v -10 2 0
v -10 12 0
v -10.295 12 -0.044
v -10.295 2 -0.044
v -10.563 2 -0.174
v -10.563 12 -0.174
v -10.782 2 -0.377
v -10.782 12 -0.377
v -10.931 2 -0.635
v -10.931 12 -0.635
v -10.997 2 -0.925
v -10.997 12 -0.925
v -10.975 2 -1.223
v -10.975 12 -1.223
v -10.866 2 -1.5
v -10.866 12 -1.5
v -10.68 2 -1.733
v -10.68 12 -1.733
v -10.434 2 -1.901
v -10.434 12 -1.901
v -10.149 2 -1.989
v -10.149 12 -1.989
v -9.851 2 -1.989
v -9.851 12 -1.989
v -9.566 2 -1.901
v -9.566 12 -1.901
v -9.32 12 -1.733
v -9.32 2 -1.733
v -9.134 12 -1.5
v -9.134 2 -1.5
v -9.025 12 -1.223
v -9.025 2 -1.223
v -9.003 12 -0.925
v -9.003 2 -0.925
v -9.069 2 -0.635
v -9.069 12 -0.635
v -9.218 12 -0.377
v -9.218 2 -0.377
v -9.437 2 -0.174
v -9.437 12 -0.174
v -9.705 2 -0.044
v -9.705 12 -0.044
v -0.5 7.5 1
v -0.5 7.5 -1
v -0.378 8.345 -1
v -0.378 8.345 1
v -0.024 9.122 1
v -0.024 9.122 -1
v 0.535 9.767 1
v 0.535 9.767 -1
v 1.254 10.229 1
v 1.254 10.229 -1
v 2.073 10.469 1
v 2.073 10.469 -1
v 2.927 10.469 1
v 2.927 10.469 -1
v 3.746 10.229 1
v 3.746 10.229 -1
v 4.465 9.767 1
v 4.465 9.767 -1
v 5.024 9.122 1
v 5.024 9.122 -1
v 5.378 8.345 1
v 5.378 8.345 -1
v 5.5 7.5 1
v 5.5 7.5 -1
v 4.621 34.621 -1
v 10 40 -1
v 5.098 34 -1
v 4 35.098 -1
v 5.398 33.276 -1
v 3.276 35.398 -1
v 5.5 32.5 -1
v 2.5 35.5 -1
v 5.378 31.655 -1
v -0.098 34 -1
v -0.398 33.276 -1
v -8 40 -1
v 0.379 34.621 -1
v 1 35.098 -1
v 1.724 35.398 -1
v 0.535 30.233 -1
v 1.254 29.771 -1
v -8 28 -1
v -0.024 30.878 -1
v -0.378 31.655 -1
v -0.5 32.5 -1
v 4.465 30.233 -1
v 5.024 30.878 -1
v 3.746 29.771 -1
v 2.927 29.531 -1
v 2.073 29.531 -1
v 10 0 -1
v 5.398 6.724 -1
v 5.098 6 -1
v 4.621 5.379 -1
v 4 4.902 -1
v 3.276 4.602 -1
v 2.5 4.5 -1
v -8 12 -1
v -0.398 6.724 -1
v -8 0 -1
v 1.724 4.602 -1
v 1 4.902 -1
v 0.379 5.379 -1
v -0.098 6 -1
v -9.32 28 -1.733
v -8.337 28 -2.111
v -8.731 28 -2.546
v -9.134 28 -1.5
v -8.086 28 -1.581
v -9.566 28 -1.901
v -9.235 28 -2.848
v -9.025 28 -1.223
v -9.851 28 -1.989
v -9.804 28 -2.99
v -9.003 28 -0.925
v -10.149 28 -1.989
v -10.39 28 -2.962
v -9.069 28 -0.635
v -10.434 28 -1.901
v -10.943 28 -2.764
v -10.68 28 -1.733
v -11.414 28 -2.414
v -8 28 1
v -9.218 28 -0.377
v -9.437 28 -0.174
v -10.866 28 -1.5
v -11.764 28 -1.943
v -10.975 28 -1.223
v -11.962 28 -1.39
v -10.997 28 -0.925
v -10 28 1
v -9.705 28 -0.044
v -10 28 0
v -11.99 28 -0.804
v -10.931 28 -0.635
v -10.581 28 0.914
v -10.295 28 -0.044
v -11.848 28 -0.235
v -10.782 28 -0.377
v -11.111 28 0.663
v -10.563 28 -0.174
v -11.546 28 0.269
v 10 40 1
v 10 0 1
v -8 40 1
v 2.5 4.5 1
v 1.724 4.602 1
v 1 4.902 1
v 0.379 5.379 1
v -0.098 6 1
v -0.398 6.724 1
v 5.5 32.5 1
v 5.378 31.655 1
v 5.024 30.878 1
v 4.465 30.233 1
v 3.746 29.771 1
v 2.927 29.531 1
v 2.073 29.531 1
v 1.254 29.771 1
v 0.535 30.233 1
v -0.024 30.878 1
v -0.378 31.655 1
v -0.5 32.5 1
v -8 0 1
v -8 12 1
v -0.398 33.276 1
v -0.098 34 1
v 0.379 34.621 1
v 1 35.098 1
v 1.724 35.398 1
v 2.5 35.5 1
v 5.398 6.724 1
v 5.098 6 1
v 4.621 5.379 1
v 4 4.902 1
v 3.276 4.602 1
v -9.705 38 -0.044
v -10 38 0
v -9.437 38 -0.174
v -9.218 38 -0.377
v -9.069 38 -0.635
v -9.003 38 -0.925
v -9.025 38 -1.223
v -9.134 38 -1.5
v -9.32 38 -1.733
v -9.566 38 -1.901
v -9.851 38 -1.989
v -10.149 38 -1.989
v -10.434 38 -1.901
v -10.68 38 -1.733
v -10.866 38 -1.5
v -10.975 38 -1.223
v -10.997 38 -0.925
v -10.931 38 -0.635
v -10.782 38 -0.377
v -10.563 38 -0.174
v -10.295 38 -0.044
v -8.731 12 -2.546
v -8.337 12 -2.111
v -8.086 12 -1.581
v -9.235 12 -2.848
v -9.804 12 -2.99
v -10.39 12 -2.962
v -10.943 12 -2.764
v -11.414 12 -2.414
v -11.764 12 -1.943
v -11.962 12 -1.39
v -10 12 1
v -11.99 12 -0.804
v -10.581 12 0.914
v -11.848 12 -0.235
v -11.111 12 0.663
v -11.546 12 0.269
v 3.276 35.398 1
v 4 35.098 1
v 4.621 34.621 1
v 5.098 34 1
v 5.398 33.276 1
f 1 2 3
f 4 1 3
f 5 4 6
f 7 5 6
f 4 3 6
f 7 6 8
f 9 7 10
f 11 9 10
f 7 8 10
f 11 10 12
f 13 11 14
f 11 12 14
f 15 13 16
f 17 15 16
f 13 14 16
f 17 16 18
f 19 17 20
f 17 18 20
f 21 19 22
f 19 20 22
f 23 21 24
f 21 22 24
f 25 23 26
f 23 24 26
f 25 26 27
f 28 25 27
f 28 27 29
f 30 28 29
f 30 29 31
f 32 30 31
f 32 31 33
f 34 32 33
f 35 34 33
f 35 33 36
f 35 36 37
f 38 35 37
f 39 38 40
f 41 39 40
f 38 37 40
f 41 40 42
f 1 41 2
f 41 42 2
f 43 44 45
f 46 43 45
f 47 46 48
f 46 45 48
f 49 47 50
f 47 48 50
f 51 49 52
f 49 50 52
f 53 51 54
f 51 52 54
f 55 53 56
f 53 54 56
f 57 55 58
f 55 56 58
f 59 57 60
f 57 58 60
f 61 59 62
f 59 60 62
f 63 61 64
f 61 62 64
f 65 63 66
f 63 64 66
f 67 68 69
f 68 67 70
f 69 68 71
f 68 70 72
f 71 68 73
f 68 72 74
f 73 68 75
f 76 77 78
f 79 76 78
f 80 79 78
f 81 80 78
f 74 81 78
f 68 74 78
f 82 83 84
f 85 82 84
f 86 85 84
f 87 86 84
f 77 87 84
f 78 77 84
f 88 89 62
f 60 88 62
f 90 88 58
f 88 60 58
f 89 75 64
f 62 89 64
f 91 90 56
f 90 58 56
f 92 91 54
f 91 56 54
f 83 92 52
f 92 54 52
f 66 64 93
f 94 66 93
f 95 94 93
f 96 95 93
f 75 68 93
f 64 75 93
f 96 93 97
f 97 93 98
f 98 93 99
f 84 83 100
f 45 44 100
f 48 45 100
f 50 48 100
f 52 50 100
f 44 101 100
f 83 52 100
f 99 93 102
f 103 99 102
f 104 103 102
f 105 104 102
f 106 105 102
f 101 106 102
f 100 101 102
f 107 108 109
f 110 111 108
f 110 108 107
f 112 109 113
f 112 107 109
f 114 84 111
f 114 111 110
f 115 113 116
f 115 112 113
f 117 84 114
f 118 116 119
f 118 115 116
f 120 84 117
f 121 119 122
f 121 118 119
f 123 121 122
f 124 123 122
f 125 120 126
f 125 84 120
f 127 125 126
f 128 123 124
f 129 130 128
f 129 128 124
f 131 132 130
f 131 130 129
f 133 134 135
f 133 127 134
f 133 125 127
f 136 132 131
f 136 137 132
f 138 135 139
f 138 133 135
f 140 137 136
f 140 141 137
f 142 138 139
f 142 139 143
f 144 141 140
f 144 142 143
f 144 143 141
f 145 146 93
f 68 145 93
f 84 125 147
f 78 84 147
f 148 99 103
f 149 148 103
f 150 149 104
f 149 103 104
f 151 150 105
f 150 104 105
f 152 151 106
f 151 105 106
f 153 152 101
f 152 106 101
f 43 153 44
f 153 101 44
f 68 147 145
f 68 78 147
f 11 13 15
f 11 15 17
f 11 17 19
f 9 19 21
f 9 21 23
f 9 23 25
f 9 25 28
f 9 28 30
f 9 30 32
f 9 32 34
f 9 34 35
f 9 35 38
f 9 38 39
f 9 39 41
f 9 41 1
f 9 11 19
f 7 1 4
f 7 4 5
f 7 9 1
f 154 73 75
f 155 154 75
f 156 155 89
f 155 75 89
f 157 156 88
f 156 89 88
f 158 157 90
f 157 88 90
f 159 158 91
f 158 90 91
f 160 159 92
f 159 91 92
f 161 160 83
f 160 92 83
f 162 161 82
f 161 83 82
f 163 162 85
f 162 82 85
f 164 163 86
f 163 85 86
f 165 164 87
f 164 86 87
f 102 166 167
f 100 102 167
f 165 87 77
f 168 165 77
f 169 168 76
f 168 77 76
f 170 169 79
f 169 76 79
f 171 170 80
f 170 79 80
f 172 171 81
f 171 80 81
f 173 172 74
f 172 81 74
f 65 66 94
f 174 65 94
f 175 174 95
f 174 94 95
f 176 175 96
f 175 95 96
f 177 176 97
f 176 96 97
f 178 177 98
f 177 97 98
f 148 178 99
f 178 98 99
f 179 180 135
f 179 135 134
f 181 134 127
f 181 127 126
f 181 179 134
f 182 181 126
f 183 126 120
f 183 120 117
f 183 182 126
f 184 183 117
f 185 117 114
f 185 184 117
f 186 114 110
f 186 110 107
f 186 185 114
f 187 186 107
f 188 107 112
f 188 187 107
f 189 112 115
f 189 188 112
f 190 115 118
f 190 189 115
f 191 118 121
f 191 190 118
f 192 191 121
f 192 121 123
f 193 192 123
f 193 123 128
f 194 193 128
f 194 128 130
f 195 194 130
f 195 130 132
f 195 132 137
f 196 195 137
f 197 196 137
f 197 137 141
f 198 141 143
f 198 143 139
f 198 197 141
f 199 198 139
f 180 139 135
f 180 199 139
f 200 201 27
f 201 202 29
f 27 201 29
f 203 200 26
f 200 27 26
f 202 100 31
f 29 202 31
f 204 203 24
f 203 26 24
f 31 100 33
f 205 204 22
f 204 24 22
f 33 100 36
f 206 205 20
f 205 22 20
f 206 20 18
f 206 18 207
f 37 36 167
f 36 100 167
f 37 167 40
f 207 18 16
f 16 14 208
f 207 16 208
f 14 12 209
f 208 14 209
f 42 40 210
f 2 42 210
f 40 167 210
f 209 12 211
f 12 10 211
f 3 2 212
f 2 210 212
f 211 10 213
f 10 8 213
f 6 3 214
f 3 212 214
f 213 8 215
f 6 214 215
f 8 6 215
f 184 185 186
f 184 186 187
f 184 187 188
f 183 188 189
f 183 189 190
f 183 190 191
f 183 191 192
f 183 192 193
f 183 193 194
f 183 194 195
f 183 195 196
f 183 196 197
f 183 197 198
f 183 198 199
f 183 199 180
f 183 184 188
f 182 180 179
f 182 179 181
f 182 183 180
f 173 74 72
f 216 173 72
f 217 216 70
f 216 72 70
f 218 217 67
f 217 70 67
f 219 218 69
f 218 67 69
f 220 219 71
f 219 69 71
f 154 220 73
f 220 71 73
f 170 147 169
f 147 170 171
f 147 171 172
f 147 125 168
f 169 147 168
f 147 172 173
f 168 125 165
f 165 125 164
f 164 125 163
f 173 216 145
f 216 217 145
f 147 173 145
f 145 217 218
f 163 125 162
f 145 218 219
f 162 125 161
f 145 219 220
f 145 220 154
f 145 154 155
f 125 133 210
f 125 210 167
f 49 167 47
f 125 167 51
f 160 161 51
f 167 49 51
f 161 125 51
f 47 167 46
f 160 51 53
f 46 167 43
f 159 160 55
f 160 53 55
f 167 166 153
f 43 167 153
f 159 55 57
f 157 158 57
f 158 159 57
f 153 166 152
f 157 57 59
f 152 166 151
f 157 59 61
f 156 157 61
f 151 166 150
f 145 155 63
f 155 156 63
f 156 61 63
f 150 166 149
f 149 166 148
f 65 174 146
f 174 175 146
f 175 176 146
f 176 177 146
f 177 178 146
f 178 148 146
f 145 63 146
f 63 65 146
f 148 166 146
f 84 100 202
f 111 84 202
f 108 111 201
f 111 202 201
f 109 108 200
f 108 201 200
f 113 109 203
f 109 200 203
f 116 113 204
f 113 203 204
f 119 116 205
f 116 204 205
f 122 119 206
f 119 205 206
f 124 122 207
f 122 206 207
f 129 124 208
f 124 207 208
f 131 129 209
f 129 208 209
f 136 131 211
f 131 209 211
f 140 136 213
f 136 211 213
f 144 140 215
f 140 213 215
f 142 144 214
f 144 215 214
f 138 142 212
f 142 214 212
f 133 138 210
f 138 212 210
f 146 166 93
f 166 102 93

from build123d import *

# Parameters (mm, degrees)
EXTRUDE_1_DEPTH          = 40
CUT_EXTRUDE_1_DEPTH      = 40
CUT_EXTRUDE_1_DEPTH_BACK = 40
SKETCH_2_W               = 4
SKETCH_2_H               = 12
EXTRUDE_2_DEPTH          = 10
EXTRUDE_START            = 10
EXTRUDE_3_DEPTH          = 10
SKETCH_5_R               = 3
CUT_EXTRUDE_2_DEPTH      = 10


with BuildPart() as part:
    # 草图1 → 凸台-拉伸1 (new body)
    with BuildSketch(Plane(origin=(0, 0, 0), x_dir=(1, 0, 0), z_dir=(0, 1, 0))):
        with BuildLine():
            Line((10, 1), (-8, 1))
            ThreePointArc((-8, 1), (-11.414213562, 2.414213562), (-10, -1))
            Line((-10, -1), (10, -1))
            Line((10, -1), (10, 1))
        make_face()
    extrude(amount=EXTRUDE_1_DEPTH)

    # 草图2 → 切除-拉伸1 (cut, two sides: drawn at the far end of the back side and taken through both)
    with BuildSketch(Plane(origin=(0, 0, -1), x_dir=(-1, 0, 0), z_dir=(0, 0, -1)).offset(-CUT_EXTRUDE_1_DEPTH_BACK)):
        with Locations((10, 6)):
            Rectangle(SKETCH_2_W, SKETCH_2_H)
        with Locations((10, 34)):
            Rectangle(SKETCH_2_W, SKETCH_2_H)
    extrude(amount=CUT_EXTRUDE_1_DEPTH + CUT_EXTRUDE_1_DEPTH_BACK, mode=Mode.SUBTRACT)

    # 草图3 → 凸台-拉伸2 (add)
    with BuildSketch(Plane(origin=(0, 12, 0), x_dir=(-1, 0, 0), z_dir=(0, -1, 0))):
        with BuildLine():
            ThreePointArc((9, 1), (10, 0), (11, 1))
            ThreePointArc((11, 1), (10, 2), (9, 1))
        make_face()
    extrude(amount=EXTRUDE_2_DEPTH)

    # 草图4 → 凸台-拉伸3 (add)
    with BuildSketch(Plane(origin=(0, 28, 0), x_dir=(1, 0, 0), z_dir=(0, 1, 0)).offset(EXTRUDE_START)):
        with BuildLine():
            ThreePointArc((-10, 2), (-10.707106781, 0.292893219), (-9, 1))
            ThreePointArc((-9, 1), (-9.292893219, 1.707106781), (-10, 2))
        make_face()
    extrude(amount=-EXTRUDE_3_DEPTH)

    # 草图5 → 切除-拉伸2 (cut)
    with BuildSketch(Plane(origin=(0, 0, -1), x_dir=(-1, 0, 0), z_dir=(0, 0, -1))):
        with Locations((-2.5, 32.5)):
            Circle(SKETCH_5_R)
        with Locations((-2.5, 7.5)):
            Circle(SKETCH_5_R)
    extrude(amount=-CUT_EXTRUDE_2_DEPTH, mode=Mode.SUBTRACT)


solid = part.part
